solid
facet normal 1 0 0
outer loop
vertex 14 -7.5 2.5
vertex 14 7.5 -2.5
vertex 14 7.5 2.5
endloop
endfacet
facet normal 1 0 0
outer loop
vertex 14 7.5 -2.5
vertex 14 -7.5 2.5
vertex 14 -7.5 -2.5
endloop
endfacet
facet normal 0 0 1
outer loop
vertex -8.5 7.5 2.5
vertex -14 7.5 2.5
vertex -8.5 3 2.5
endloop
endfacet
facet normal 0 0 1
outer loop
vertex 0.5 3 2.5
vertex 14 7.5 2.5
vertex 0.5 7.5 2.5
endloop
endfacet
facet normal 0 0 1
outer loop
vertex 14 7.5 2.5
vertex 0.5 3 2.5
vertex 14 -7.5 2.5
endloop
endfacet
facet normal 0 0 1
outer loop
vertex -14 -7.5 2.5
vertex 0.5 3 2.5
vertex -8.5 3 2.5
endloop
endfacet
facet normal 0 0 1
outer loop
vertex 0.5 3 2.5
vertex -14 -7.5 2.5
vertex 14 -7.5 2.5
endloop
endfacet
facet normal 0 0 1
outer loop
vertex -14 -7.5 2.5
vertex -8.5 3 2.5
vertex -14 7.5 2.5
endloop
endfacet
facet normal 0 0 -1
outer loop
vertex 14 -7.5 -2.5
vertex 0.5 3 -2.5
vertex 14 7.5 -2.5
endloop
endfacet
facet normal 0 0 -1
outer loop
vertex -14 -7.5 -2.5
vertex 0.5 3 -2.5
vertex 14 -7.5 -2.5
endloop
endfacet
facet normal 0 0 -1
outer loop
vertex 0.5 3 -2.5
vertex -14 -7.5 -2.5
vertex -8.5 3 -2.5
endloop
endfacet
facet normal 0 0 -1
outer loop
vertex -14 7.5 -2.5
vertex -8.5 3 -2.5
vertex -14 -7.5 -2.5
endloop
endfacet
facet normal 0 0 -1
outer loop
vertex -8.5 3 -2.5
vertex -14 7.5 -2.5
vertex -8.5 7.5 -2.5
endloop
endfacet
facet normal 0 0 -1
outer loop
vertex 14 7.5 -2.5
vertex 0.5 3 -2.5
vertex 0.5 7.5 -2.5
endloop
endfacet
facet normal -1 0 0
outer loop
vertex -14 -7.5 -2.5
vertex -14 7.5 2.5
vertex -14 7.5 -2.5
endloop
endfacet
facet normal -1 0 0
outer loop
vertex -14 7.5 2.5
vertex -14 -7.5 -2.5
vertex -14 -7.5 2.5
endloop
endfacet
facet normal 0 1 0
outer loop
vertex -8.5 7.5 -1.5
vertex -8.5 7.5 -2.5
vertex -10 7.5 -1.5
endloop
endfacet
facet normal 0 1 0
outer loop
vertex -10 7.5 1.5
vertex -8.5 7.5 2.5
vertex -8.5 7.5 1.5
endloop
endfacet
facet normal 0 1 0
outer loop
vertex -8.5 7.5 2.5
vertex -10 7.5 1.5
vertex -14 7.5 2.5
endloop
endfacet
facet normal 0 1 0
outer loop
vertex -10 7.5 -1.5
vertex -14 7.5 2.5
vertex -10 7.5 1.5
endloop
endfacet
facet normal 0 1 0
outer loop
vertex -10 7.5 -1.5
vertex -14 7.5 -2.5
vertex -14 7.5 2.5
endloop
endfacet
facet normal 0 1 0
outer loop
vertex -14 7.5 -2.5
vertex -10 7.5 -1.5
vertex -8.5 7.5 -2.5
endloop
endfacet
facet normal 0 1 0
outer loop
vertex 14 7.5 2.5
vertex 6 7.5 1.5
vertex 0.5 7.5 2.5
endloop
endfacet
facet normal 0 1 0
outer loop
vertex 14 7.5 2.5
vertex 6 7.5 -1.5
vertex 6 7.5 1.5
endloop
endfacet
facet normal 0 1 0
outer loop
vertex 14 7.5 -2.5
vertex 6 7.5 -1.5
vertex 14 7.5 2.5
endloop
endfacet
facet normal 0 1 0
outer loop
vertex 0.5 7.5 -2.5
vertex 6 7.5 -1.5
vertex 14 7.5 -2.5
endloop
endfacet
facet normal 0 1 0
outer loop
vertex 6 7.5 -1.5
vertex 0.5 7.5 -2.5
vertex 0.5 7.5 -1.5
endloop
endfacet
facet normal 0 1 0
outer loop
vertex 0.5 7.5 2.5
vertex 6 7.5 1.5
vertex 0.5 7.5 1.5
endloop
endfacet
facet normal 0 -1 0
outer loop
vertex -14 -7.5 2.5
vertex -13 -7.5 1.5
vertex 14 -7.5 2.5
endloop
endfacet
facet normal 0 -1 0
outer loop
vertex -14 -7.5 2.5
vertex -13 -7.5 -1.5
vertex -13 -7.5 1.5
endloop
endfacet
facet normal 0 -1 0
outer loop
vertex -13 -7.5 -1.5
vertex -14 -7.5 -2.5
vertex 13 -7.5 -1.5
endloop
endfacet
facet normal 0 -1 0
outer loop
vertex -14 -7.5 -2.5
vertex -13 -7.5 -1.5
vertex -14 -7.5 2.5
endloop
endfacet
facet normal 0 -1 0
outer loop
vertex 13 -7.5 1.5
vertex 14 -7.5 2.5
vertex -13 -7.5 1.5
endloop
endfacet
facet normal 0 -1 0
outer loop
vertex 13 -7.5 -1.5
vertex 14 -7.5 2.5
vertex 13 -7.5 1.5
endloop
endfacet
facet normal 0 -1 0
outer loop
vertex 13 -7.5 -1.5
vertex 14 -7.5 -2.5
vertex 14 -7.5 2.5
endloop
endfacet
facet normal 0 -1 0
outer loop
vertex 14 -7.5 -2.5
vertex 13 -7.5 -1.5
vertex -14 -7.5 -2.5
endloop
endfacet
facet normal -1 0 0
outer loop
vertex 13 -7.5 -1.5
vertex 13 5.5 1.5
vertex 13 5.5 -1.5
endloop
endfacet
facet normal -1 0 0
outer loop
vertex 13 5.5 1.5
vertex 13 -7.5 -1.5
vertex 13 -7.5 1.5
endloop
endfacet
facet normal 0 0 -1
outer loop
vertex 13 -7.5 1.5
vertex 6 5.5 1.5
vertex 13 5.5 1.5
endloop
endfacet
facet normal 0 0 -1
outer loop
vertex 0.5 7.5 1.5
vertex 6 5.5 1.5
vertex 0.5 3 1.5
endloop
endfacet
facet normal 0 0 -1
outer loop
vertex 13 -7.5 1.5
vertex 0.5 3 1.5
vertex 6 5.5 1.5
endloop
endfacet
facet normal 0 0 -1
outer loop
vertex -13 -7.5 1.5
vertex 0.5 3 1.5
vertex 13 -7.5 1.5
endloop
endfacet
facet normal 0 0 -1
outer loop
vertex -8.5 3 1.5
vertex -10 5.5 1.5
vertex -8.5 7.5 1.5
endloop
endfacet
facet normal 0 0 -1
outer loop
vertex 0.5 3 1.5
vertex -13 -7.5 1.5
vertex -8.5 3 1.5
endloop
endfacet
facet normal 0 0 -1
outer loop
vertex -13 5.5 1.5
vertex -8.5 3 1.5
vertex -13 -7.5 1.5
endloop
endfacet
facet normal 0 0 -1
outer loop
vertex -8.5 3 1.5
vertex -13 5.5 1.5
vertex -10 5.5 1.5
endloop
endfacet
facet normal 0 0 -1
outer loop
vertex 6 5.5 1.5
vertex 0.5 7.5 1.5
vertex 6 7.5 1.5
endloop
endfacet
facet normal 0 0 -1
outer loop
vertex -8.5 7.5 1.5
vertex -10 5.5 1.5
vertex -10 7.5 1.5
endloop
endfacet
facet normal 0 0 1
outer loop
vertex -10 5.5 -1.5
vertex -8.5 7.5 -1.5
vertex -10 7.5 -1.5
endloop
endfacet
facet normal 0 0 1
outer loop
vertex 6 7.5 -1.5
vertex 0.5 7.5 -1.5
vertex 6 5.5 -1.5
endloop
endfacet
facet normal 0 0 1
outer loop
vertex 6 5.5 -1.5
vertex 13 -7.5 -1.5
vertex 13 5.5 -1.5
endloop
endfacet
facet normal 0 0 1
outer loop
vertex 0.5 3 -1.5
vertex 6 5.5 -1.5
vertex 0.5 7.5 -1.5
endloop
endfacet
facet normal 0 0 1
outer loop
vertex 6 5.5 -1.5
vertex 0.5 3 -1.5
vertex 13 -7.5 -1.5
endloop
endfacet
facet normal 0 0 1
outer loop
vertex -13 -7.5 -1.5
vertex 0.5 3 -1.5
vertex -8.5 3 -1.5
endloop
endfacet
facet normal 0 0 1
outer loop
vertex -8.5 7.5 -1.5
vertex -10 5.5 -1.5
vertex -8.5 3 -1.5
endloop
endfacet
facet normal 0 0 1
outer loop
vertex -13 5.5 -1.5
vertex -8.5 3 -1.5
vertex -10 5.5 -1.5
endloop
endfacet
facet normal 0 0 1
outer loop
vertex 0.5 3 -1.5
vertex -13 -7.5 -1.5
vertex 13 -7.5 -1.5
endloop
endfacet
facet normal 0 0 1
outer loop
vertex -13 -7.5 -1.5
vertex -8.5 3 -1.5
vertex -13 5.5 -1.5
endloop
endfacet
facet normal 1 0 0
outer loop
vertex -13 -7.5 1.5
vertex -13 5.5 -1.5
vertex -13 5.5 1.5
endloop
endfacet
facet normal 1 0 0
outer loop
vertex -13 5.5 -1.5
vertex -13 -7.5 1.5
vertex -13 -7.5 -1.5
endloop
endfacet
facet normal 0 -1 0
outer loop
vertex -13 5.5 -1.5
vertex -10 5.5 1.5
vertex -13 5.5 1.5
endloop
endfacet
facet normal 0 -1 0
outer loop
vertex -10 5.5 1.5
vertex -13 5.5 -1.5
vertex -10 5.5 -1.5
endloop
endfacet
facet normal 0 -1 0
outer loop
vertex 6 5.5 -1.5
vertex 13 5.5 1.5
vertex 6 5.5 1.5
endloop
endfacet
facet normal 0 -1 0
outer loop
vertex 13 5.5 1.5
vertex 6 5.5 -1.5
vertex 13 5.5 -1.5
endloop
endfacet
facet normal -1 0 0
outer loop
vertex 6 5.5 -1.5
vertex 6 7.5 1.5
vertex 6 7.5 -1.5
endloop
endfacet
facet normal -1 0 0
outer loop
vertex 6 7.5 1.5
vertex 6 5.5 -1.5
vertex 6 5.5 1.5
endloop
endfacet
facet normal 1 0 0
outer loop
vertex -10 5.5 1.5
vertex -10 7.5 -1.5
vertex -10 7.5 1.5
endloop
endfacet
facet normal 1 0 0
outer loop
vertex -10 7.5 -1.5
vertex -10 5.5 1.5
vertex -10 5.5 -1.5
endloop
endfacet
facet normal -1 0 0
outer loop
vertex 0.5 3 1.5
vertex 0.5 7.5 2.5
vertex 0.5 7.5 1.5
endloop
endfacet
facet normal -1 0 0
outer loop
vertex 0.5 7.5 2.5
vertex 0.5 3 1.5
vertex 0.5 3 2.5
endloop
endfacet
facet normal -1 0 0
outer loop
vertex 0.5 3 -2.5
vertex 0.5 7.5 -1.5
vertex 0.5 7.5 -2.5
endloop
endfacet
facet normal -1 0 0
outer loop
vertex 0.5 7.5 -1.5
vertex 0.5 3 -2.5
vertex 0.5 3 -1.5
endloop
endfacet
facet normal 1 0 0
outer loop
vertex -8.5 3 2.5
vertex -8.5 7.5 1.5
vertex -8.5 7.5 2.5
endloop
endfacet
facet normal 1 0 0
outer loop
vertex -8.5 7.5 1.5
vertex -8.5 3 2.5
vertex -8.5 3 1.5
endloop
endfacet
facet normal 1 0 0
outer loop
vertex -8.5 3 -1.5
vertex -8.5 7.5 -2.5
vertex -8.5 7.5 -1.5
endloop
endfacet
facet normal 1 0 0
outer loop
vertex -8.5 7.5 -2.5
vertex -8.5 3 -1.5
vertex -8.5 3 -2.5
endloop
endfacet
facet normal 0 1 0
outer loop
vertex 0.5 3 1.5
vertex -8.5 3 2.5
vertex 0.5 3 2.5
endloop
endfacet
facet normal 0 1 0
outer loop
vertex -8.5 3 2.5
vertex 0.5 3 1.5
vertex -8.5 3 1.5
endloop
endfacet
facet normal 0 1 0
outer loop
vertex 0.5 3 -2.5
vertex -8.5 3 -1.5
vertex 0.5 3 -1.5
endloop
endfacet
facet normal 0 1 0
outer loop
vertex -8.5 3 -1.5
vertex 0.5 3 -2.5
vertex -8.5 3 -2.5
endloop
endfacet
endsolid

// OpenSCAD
//difference(){
WIDTH=26;
difference(){
	color("green")cube([WIDTH+2,15,5], center=true);
   translate([0,-6,0])
	cube([WIDTH,23,3], center=true);
   translate([-2,0,0])
   cube([16,23,3], center=true);
   translate([-4,8,0])
   cube([9,10,5], center=true);
}
//translate([0,0,50]);
//cube([100,100,100], center=true);}
